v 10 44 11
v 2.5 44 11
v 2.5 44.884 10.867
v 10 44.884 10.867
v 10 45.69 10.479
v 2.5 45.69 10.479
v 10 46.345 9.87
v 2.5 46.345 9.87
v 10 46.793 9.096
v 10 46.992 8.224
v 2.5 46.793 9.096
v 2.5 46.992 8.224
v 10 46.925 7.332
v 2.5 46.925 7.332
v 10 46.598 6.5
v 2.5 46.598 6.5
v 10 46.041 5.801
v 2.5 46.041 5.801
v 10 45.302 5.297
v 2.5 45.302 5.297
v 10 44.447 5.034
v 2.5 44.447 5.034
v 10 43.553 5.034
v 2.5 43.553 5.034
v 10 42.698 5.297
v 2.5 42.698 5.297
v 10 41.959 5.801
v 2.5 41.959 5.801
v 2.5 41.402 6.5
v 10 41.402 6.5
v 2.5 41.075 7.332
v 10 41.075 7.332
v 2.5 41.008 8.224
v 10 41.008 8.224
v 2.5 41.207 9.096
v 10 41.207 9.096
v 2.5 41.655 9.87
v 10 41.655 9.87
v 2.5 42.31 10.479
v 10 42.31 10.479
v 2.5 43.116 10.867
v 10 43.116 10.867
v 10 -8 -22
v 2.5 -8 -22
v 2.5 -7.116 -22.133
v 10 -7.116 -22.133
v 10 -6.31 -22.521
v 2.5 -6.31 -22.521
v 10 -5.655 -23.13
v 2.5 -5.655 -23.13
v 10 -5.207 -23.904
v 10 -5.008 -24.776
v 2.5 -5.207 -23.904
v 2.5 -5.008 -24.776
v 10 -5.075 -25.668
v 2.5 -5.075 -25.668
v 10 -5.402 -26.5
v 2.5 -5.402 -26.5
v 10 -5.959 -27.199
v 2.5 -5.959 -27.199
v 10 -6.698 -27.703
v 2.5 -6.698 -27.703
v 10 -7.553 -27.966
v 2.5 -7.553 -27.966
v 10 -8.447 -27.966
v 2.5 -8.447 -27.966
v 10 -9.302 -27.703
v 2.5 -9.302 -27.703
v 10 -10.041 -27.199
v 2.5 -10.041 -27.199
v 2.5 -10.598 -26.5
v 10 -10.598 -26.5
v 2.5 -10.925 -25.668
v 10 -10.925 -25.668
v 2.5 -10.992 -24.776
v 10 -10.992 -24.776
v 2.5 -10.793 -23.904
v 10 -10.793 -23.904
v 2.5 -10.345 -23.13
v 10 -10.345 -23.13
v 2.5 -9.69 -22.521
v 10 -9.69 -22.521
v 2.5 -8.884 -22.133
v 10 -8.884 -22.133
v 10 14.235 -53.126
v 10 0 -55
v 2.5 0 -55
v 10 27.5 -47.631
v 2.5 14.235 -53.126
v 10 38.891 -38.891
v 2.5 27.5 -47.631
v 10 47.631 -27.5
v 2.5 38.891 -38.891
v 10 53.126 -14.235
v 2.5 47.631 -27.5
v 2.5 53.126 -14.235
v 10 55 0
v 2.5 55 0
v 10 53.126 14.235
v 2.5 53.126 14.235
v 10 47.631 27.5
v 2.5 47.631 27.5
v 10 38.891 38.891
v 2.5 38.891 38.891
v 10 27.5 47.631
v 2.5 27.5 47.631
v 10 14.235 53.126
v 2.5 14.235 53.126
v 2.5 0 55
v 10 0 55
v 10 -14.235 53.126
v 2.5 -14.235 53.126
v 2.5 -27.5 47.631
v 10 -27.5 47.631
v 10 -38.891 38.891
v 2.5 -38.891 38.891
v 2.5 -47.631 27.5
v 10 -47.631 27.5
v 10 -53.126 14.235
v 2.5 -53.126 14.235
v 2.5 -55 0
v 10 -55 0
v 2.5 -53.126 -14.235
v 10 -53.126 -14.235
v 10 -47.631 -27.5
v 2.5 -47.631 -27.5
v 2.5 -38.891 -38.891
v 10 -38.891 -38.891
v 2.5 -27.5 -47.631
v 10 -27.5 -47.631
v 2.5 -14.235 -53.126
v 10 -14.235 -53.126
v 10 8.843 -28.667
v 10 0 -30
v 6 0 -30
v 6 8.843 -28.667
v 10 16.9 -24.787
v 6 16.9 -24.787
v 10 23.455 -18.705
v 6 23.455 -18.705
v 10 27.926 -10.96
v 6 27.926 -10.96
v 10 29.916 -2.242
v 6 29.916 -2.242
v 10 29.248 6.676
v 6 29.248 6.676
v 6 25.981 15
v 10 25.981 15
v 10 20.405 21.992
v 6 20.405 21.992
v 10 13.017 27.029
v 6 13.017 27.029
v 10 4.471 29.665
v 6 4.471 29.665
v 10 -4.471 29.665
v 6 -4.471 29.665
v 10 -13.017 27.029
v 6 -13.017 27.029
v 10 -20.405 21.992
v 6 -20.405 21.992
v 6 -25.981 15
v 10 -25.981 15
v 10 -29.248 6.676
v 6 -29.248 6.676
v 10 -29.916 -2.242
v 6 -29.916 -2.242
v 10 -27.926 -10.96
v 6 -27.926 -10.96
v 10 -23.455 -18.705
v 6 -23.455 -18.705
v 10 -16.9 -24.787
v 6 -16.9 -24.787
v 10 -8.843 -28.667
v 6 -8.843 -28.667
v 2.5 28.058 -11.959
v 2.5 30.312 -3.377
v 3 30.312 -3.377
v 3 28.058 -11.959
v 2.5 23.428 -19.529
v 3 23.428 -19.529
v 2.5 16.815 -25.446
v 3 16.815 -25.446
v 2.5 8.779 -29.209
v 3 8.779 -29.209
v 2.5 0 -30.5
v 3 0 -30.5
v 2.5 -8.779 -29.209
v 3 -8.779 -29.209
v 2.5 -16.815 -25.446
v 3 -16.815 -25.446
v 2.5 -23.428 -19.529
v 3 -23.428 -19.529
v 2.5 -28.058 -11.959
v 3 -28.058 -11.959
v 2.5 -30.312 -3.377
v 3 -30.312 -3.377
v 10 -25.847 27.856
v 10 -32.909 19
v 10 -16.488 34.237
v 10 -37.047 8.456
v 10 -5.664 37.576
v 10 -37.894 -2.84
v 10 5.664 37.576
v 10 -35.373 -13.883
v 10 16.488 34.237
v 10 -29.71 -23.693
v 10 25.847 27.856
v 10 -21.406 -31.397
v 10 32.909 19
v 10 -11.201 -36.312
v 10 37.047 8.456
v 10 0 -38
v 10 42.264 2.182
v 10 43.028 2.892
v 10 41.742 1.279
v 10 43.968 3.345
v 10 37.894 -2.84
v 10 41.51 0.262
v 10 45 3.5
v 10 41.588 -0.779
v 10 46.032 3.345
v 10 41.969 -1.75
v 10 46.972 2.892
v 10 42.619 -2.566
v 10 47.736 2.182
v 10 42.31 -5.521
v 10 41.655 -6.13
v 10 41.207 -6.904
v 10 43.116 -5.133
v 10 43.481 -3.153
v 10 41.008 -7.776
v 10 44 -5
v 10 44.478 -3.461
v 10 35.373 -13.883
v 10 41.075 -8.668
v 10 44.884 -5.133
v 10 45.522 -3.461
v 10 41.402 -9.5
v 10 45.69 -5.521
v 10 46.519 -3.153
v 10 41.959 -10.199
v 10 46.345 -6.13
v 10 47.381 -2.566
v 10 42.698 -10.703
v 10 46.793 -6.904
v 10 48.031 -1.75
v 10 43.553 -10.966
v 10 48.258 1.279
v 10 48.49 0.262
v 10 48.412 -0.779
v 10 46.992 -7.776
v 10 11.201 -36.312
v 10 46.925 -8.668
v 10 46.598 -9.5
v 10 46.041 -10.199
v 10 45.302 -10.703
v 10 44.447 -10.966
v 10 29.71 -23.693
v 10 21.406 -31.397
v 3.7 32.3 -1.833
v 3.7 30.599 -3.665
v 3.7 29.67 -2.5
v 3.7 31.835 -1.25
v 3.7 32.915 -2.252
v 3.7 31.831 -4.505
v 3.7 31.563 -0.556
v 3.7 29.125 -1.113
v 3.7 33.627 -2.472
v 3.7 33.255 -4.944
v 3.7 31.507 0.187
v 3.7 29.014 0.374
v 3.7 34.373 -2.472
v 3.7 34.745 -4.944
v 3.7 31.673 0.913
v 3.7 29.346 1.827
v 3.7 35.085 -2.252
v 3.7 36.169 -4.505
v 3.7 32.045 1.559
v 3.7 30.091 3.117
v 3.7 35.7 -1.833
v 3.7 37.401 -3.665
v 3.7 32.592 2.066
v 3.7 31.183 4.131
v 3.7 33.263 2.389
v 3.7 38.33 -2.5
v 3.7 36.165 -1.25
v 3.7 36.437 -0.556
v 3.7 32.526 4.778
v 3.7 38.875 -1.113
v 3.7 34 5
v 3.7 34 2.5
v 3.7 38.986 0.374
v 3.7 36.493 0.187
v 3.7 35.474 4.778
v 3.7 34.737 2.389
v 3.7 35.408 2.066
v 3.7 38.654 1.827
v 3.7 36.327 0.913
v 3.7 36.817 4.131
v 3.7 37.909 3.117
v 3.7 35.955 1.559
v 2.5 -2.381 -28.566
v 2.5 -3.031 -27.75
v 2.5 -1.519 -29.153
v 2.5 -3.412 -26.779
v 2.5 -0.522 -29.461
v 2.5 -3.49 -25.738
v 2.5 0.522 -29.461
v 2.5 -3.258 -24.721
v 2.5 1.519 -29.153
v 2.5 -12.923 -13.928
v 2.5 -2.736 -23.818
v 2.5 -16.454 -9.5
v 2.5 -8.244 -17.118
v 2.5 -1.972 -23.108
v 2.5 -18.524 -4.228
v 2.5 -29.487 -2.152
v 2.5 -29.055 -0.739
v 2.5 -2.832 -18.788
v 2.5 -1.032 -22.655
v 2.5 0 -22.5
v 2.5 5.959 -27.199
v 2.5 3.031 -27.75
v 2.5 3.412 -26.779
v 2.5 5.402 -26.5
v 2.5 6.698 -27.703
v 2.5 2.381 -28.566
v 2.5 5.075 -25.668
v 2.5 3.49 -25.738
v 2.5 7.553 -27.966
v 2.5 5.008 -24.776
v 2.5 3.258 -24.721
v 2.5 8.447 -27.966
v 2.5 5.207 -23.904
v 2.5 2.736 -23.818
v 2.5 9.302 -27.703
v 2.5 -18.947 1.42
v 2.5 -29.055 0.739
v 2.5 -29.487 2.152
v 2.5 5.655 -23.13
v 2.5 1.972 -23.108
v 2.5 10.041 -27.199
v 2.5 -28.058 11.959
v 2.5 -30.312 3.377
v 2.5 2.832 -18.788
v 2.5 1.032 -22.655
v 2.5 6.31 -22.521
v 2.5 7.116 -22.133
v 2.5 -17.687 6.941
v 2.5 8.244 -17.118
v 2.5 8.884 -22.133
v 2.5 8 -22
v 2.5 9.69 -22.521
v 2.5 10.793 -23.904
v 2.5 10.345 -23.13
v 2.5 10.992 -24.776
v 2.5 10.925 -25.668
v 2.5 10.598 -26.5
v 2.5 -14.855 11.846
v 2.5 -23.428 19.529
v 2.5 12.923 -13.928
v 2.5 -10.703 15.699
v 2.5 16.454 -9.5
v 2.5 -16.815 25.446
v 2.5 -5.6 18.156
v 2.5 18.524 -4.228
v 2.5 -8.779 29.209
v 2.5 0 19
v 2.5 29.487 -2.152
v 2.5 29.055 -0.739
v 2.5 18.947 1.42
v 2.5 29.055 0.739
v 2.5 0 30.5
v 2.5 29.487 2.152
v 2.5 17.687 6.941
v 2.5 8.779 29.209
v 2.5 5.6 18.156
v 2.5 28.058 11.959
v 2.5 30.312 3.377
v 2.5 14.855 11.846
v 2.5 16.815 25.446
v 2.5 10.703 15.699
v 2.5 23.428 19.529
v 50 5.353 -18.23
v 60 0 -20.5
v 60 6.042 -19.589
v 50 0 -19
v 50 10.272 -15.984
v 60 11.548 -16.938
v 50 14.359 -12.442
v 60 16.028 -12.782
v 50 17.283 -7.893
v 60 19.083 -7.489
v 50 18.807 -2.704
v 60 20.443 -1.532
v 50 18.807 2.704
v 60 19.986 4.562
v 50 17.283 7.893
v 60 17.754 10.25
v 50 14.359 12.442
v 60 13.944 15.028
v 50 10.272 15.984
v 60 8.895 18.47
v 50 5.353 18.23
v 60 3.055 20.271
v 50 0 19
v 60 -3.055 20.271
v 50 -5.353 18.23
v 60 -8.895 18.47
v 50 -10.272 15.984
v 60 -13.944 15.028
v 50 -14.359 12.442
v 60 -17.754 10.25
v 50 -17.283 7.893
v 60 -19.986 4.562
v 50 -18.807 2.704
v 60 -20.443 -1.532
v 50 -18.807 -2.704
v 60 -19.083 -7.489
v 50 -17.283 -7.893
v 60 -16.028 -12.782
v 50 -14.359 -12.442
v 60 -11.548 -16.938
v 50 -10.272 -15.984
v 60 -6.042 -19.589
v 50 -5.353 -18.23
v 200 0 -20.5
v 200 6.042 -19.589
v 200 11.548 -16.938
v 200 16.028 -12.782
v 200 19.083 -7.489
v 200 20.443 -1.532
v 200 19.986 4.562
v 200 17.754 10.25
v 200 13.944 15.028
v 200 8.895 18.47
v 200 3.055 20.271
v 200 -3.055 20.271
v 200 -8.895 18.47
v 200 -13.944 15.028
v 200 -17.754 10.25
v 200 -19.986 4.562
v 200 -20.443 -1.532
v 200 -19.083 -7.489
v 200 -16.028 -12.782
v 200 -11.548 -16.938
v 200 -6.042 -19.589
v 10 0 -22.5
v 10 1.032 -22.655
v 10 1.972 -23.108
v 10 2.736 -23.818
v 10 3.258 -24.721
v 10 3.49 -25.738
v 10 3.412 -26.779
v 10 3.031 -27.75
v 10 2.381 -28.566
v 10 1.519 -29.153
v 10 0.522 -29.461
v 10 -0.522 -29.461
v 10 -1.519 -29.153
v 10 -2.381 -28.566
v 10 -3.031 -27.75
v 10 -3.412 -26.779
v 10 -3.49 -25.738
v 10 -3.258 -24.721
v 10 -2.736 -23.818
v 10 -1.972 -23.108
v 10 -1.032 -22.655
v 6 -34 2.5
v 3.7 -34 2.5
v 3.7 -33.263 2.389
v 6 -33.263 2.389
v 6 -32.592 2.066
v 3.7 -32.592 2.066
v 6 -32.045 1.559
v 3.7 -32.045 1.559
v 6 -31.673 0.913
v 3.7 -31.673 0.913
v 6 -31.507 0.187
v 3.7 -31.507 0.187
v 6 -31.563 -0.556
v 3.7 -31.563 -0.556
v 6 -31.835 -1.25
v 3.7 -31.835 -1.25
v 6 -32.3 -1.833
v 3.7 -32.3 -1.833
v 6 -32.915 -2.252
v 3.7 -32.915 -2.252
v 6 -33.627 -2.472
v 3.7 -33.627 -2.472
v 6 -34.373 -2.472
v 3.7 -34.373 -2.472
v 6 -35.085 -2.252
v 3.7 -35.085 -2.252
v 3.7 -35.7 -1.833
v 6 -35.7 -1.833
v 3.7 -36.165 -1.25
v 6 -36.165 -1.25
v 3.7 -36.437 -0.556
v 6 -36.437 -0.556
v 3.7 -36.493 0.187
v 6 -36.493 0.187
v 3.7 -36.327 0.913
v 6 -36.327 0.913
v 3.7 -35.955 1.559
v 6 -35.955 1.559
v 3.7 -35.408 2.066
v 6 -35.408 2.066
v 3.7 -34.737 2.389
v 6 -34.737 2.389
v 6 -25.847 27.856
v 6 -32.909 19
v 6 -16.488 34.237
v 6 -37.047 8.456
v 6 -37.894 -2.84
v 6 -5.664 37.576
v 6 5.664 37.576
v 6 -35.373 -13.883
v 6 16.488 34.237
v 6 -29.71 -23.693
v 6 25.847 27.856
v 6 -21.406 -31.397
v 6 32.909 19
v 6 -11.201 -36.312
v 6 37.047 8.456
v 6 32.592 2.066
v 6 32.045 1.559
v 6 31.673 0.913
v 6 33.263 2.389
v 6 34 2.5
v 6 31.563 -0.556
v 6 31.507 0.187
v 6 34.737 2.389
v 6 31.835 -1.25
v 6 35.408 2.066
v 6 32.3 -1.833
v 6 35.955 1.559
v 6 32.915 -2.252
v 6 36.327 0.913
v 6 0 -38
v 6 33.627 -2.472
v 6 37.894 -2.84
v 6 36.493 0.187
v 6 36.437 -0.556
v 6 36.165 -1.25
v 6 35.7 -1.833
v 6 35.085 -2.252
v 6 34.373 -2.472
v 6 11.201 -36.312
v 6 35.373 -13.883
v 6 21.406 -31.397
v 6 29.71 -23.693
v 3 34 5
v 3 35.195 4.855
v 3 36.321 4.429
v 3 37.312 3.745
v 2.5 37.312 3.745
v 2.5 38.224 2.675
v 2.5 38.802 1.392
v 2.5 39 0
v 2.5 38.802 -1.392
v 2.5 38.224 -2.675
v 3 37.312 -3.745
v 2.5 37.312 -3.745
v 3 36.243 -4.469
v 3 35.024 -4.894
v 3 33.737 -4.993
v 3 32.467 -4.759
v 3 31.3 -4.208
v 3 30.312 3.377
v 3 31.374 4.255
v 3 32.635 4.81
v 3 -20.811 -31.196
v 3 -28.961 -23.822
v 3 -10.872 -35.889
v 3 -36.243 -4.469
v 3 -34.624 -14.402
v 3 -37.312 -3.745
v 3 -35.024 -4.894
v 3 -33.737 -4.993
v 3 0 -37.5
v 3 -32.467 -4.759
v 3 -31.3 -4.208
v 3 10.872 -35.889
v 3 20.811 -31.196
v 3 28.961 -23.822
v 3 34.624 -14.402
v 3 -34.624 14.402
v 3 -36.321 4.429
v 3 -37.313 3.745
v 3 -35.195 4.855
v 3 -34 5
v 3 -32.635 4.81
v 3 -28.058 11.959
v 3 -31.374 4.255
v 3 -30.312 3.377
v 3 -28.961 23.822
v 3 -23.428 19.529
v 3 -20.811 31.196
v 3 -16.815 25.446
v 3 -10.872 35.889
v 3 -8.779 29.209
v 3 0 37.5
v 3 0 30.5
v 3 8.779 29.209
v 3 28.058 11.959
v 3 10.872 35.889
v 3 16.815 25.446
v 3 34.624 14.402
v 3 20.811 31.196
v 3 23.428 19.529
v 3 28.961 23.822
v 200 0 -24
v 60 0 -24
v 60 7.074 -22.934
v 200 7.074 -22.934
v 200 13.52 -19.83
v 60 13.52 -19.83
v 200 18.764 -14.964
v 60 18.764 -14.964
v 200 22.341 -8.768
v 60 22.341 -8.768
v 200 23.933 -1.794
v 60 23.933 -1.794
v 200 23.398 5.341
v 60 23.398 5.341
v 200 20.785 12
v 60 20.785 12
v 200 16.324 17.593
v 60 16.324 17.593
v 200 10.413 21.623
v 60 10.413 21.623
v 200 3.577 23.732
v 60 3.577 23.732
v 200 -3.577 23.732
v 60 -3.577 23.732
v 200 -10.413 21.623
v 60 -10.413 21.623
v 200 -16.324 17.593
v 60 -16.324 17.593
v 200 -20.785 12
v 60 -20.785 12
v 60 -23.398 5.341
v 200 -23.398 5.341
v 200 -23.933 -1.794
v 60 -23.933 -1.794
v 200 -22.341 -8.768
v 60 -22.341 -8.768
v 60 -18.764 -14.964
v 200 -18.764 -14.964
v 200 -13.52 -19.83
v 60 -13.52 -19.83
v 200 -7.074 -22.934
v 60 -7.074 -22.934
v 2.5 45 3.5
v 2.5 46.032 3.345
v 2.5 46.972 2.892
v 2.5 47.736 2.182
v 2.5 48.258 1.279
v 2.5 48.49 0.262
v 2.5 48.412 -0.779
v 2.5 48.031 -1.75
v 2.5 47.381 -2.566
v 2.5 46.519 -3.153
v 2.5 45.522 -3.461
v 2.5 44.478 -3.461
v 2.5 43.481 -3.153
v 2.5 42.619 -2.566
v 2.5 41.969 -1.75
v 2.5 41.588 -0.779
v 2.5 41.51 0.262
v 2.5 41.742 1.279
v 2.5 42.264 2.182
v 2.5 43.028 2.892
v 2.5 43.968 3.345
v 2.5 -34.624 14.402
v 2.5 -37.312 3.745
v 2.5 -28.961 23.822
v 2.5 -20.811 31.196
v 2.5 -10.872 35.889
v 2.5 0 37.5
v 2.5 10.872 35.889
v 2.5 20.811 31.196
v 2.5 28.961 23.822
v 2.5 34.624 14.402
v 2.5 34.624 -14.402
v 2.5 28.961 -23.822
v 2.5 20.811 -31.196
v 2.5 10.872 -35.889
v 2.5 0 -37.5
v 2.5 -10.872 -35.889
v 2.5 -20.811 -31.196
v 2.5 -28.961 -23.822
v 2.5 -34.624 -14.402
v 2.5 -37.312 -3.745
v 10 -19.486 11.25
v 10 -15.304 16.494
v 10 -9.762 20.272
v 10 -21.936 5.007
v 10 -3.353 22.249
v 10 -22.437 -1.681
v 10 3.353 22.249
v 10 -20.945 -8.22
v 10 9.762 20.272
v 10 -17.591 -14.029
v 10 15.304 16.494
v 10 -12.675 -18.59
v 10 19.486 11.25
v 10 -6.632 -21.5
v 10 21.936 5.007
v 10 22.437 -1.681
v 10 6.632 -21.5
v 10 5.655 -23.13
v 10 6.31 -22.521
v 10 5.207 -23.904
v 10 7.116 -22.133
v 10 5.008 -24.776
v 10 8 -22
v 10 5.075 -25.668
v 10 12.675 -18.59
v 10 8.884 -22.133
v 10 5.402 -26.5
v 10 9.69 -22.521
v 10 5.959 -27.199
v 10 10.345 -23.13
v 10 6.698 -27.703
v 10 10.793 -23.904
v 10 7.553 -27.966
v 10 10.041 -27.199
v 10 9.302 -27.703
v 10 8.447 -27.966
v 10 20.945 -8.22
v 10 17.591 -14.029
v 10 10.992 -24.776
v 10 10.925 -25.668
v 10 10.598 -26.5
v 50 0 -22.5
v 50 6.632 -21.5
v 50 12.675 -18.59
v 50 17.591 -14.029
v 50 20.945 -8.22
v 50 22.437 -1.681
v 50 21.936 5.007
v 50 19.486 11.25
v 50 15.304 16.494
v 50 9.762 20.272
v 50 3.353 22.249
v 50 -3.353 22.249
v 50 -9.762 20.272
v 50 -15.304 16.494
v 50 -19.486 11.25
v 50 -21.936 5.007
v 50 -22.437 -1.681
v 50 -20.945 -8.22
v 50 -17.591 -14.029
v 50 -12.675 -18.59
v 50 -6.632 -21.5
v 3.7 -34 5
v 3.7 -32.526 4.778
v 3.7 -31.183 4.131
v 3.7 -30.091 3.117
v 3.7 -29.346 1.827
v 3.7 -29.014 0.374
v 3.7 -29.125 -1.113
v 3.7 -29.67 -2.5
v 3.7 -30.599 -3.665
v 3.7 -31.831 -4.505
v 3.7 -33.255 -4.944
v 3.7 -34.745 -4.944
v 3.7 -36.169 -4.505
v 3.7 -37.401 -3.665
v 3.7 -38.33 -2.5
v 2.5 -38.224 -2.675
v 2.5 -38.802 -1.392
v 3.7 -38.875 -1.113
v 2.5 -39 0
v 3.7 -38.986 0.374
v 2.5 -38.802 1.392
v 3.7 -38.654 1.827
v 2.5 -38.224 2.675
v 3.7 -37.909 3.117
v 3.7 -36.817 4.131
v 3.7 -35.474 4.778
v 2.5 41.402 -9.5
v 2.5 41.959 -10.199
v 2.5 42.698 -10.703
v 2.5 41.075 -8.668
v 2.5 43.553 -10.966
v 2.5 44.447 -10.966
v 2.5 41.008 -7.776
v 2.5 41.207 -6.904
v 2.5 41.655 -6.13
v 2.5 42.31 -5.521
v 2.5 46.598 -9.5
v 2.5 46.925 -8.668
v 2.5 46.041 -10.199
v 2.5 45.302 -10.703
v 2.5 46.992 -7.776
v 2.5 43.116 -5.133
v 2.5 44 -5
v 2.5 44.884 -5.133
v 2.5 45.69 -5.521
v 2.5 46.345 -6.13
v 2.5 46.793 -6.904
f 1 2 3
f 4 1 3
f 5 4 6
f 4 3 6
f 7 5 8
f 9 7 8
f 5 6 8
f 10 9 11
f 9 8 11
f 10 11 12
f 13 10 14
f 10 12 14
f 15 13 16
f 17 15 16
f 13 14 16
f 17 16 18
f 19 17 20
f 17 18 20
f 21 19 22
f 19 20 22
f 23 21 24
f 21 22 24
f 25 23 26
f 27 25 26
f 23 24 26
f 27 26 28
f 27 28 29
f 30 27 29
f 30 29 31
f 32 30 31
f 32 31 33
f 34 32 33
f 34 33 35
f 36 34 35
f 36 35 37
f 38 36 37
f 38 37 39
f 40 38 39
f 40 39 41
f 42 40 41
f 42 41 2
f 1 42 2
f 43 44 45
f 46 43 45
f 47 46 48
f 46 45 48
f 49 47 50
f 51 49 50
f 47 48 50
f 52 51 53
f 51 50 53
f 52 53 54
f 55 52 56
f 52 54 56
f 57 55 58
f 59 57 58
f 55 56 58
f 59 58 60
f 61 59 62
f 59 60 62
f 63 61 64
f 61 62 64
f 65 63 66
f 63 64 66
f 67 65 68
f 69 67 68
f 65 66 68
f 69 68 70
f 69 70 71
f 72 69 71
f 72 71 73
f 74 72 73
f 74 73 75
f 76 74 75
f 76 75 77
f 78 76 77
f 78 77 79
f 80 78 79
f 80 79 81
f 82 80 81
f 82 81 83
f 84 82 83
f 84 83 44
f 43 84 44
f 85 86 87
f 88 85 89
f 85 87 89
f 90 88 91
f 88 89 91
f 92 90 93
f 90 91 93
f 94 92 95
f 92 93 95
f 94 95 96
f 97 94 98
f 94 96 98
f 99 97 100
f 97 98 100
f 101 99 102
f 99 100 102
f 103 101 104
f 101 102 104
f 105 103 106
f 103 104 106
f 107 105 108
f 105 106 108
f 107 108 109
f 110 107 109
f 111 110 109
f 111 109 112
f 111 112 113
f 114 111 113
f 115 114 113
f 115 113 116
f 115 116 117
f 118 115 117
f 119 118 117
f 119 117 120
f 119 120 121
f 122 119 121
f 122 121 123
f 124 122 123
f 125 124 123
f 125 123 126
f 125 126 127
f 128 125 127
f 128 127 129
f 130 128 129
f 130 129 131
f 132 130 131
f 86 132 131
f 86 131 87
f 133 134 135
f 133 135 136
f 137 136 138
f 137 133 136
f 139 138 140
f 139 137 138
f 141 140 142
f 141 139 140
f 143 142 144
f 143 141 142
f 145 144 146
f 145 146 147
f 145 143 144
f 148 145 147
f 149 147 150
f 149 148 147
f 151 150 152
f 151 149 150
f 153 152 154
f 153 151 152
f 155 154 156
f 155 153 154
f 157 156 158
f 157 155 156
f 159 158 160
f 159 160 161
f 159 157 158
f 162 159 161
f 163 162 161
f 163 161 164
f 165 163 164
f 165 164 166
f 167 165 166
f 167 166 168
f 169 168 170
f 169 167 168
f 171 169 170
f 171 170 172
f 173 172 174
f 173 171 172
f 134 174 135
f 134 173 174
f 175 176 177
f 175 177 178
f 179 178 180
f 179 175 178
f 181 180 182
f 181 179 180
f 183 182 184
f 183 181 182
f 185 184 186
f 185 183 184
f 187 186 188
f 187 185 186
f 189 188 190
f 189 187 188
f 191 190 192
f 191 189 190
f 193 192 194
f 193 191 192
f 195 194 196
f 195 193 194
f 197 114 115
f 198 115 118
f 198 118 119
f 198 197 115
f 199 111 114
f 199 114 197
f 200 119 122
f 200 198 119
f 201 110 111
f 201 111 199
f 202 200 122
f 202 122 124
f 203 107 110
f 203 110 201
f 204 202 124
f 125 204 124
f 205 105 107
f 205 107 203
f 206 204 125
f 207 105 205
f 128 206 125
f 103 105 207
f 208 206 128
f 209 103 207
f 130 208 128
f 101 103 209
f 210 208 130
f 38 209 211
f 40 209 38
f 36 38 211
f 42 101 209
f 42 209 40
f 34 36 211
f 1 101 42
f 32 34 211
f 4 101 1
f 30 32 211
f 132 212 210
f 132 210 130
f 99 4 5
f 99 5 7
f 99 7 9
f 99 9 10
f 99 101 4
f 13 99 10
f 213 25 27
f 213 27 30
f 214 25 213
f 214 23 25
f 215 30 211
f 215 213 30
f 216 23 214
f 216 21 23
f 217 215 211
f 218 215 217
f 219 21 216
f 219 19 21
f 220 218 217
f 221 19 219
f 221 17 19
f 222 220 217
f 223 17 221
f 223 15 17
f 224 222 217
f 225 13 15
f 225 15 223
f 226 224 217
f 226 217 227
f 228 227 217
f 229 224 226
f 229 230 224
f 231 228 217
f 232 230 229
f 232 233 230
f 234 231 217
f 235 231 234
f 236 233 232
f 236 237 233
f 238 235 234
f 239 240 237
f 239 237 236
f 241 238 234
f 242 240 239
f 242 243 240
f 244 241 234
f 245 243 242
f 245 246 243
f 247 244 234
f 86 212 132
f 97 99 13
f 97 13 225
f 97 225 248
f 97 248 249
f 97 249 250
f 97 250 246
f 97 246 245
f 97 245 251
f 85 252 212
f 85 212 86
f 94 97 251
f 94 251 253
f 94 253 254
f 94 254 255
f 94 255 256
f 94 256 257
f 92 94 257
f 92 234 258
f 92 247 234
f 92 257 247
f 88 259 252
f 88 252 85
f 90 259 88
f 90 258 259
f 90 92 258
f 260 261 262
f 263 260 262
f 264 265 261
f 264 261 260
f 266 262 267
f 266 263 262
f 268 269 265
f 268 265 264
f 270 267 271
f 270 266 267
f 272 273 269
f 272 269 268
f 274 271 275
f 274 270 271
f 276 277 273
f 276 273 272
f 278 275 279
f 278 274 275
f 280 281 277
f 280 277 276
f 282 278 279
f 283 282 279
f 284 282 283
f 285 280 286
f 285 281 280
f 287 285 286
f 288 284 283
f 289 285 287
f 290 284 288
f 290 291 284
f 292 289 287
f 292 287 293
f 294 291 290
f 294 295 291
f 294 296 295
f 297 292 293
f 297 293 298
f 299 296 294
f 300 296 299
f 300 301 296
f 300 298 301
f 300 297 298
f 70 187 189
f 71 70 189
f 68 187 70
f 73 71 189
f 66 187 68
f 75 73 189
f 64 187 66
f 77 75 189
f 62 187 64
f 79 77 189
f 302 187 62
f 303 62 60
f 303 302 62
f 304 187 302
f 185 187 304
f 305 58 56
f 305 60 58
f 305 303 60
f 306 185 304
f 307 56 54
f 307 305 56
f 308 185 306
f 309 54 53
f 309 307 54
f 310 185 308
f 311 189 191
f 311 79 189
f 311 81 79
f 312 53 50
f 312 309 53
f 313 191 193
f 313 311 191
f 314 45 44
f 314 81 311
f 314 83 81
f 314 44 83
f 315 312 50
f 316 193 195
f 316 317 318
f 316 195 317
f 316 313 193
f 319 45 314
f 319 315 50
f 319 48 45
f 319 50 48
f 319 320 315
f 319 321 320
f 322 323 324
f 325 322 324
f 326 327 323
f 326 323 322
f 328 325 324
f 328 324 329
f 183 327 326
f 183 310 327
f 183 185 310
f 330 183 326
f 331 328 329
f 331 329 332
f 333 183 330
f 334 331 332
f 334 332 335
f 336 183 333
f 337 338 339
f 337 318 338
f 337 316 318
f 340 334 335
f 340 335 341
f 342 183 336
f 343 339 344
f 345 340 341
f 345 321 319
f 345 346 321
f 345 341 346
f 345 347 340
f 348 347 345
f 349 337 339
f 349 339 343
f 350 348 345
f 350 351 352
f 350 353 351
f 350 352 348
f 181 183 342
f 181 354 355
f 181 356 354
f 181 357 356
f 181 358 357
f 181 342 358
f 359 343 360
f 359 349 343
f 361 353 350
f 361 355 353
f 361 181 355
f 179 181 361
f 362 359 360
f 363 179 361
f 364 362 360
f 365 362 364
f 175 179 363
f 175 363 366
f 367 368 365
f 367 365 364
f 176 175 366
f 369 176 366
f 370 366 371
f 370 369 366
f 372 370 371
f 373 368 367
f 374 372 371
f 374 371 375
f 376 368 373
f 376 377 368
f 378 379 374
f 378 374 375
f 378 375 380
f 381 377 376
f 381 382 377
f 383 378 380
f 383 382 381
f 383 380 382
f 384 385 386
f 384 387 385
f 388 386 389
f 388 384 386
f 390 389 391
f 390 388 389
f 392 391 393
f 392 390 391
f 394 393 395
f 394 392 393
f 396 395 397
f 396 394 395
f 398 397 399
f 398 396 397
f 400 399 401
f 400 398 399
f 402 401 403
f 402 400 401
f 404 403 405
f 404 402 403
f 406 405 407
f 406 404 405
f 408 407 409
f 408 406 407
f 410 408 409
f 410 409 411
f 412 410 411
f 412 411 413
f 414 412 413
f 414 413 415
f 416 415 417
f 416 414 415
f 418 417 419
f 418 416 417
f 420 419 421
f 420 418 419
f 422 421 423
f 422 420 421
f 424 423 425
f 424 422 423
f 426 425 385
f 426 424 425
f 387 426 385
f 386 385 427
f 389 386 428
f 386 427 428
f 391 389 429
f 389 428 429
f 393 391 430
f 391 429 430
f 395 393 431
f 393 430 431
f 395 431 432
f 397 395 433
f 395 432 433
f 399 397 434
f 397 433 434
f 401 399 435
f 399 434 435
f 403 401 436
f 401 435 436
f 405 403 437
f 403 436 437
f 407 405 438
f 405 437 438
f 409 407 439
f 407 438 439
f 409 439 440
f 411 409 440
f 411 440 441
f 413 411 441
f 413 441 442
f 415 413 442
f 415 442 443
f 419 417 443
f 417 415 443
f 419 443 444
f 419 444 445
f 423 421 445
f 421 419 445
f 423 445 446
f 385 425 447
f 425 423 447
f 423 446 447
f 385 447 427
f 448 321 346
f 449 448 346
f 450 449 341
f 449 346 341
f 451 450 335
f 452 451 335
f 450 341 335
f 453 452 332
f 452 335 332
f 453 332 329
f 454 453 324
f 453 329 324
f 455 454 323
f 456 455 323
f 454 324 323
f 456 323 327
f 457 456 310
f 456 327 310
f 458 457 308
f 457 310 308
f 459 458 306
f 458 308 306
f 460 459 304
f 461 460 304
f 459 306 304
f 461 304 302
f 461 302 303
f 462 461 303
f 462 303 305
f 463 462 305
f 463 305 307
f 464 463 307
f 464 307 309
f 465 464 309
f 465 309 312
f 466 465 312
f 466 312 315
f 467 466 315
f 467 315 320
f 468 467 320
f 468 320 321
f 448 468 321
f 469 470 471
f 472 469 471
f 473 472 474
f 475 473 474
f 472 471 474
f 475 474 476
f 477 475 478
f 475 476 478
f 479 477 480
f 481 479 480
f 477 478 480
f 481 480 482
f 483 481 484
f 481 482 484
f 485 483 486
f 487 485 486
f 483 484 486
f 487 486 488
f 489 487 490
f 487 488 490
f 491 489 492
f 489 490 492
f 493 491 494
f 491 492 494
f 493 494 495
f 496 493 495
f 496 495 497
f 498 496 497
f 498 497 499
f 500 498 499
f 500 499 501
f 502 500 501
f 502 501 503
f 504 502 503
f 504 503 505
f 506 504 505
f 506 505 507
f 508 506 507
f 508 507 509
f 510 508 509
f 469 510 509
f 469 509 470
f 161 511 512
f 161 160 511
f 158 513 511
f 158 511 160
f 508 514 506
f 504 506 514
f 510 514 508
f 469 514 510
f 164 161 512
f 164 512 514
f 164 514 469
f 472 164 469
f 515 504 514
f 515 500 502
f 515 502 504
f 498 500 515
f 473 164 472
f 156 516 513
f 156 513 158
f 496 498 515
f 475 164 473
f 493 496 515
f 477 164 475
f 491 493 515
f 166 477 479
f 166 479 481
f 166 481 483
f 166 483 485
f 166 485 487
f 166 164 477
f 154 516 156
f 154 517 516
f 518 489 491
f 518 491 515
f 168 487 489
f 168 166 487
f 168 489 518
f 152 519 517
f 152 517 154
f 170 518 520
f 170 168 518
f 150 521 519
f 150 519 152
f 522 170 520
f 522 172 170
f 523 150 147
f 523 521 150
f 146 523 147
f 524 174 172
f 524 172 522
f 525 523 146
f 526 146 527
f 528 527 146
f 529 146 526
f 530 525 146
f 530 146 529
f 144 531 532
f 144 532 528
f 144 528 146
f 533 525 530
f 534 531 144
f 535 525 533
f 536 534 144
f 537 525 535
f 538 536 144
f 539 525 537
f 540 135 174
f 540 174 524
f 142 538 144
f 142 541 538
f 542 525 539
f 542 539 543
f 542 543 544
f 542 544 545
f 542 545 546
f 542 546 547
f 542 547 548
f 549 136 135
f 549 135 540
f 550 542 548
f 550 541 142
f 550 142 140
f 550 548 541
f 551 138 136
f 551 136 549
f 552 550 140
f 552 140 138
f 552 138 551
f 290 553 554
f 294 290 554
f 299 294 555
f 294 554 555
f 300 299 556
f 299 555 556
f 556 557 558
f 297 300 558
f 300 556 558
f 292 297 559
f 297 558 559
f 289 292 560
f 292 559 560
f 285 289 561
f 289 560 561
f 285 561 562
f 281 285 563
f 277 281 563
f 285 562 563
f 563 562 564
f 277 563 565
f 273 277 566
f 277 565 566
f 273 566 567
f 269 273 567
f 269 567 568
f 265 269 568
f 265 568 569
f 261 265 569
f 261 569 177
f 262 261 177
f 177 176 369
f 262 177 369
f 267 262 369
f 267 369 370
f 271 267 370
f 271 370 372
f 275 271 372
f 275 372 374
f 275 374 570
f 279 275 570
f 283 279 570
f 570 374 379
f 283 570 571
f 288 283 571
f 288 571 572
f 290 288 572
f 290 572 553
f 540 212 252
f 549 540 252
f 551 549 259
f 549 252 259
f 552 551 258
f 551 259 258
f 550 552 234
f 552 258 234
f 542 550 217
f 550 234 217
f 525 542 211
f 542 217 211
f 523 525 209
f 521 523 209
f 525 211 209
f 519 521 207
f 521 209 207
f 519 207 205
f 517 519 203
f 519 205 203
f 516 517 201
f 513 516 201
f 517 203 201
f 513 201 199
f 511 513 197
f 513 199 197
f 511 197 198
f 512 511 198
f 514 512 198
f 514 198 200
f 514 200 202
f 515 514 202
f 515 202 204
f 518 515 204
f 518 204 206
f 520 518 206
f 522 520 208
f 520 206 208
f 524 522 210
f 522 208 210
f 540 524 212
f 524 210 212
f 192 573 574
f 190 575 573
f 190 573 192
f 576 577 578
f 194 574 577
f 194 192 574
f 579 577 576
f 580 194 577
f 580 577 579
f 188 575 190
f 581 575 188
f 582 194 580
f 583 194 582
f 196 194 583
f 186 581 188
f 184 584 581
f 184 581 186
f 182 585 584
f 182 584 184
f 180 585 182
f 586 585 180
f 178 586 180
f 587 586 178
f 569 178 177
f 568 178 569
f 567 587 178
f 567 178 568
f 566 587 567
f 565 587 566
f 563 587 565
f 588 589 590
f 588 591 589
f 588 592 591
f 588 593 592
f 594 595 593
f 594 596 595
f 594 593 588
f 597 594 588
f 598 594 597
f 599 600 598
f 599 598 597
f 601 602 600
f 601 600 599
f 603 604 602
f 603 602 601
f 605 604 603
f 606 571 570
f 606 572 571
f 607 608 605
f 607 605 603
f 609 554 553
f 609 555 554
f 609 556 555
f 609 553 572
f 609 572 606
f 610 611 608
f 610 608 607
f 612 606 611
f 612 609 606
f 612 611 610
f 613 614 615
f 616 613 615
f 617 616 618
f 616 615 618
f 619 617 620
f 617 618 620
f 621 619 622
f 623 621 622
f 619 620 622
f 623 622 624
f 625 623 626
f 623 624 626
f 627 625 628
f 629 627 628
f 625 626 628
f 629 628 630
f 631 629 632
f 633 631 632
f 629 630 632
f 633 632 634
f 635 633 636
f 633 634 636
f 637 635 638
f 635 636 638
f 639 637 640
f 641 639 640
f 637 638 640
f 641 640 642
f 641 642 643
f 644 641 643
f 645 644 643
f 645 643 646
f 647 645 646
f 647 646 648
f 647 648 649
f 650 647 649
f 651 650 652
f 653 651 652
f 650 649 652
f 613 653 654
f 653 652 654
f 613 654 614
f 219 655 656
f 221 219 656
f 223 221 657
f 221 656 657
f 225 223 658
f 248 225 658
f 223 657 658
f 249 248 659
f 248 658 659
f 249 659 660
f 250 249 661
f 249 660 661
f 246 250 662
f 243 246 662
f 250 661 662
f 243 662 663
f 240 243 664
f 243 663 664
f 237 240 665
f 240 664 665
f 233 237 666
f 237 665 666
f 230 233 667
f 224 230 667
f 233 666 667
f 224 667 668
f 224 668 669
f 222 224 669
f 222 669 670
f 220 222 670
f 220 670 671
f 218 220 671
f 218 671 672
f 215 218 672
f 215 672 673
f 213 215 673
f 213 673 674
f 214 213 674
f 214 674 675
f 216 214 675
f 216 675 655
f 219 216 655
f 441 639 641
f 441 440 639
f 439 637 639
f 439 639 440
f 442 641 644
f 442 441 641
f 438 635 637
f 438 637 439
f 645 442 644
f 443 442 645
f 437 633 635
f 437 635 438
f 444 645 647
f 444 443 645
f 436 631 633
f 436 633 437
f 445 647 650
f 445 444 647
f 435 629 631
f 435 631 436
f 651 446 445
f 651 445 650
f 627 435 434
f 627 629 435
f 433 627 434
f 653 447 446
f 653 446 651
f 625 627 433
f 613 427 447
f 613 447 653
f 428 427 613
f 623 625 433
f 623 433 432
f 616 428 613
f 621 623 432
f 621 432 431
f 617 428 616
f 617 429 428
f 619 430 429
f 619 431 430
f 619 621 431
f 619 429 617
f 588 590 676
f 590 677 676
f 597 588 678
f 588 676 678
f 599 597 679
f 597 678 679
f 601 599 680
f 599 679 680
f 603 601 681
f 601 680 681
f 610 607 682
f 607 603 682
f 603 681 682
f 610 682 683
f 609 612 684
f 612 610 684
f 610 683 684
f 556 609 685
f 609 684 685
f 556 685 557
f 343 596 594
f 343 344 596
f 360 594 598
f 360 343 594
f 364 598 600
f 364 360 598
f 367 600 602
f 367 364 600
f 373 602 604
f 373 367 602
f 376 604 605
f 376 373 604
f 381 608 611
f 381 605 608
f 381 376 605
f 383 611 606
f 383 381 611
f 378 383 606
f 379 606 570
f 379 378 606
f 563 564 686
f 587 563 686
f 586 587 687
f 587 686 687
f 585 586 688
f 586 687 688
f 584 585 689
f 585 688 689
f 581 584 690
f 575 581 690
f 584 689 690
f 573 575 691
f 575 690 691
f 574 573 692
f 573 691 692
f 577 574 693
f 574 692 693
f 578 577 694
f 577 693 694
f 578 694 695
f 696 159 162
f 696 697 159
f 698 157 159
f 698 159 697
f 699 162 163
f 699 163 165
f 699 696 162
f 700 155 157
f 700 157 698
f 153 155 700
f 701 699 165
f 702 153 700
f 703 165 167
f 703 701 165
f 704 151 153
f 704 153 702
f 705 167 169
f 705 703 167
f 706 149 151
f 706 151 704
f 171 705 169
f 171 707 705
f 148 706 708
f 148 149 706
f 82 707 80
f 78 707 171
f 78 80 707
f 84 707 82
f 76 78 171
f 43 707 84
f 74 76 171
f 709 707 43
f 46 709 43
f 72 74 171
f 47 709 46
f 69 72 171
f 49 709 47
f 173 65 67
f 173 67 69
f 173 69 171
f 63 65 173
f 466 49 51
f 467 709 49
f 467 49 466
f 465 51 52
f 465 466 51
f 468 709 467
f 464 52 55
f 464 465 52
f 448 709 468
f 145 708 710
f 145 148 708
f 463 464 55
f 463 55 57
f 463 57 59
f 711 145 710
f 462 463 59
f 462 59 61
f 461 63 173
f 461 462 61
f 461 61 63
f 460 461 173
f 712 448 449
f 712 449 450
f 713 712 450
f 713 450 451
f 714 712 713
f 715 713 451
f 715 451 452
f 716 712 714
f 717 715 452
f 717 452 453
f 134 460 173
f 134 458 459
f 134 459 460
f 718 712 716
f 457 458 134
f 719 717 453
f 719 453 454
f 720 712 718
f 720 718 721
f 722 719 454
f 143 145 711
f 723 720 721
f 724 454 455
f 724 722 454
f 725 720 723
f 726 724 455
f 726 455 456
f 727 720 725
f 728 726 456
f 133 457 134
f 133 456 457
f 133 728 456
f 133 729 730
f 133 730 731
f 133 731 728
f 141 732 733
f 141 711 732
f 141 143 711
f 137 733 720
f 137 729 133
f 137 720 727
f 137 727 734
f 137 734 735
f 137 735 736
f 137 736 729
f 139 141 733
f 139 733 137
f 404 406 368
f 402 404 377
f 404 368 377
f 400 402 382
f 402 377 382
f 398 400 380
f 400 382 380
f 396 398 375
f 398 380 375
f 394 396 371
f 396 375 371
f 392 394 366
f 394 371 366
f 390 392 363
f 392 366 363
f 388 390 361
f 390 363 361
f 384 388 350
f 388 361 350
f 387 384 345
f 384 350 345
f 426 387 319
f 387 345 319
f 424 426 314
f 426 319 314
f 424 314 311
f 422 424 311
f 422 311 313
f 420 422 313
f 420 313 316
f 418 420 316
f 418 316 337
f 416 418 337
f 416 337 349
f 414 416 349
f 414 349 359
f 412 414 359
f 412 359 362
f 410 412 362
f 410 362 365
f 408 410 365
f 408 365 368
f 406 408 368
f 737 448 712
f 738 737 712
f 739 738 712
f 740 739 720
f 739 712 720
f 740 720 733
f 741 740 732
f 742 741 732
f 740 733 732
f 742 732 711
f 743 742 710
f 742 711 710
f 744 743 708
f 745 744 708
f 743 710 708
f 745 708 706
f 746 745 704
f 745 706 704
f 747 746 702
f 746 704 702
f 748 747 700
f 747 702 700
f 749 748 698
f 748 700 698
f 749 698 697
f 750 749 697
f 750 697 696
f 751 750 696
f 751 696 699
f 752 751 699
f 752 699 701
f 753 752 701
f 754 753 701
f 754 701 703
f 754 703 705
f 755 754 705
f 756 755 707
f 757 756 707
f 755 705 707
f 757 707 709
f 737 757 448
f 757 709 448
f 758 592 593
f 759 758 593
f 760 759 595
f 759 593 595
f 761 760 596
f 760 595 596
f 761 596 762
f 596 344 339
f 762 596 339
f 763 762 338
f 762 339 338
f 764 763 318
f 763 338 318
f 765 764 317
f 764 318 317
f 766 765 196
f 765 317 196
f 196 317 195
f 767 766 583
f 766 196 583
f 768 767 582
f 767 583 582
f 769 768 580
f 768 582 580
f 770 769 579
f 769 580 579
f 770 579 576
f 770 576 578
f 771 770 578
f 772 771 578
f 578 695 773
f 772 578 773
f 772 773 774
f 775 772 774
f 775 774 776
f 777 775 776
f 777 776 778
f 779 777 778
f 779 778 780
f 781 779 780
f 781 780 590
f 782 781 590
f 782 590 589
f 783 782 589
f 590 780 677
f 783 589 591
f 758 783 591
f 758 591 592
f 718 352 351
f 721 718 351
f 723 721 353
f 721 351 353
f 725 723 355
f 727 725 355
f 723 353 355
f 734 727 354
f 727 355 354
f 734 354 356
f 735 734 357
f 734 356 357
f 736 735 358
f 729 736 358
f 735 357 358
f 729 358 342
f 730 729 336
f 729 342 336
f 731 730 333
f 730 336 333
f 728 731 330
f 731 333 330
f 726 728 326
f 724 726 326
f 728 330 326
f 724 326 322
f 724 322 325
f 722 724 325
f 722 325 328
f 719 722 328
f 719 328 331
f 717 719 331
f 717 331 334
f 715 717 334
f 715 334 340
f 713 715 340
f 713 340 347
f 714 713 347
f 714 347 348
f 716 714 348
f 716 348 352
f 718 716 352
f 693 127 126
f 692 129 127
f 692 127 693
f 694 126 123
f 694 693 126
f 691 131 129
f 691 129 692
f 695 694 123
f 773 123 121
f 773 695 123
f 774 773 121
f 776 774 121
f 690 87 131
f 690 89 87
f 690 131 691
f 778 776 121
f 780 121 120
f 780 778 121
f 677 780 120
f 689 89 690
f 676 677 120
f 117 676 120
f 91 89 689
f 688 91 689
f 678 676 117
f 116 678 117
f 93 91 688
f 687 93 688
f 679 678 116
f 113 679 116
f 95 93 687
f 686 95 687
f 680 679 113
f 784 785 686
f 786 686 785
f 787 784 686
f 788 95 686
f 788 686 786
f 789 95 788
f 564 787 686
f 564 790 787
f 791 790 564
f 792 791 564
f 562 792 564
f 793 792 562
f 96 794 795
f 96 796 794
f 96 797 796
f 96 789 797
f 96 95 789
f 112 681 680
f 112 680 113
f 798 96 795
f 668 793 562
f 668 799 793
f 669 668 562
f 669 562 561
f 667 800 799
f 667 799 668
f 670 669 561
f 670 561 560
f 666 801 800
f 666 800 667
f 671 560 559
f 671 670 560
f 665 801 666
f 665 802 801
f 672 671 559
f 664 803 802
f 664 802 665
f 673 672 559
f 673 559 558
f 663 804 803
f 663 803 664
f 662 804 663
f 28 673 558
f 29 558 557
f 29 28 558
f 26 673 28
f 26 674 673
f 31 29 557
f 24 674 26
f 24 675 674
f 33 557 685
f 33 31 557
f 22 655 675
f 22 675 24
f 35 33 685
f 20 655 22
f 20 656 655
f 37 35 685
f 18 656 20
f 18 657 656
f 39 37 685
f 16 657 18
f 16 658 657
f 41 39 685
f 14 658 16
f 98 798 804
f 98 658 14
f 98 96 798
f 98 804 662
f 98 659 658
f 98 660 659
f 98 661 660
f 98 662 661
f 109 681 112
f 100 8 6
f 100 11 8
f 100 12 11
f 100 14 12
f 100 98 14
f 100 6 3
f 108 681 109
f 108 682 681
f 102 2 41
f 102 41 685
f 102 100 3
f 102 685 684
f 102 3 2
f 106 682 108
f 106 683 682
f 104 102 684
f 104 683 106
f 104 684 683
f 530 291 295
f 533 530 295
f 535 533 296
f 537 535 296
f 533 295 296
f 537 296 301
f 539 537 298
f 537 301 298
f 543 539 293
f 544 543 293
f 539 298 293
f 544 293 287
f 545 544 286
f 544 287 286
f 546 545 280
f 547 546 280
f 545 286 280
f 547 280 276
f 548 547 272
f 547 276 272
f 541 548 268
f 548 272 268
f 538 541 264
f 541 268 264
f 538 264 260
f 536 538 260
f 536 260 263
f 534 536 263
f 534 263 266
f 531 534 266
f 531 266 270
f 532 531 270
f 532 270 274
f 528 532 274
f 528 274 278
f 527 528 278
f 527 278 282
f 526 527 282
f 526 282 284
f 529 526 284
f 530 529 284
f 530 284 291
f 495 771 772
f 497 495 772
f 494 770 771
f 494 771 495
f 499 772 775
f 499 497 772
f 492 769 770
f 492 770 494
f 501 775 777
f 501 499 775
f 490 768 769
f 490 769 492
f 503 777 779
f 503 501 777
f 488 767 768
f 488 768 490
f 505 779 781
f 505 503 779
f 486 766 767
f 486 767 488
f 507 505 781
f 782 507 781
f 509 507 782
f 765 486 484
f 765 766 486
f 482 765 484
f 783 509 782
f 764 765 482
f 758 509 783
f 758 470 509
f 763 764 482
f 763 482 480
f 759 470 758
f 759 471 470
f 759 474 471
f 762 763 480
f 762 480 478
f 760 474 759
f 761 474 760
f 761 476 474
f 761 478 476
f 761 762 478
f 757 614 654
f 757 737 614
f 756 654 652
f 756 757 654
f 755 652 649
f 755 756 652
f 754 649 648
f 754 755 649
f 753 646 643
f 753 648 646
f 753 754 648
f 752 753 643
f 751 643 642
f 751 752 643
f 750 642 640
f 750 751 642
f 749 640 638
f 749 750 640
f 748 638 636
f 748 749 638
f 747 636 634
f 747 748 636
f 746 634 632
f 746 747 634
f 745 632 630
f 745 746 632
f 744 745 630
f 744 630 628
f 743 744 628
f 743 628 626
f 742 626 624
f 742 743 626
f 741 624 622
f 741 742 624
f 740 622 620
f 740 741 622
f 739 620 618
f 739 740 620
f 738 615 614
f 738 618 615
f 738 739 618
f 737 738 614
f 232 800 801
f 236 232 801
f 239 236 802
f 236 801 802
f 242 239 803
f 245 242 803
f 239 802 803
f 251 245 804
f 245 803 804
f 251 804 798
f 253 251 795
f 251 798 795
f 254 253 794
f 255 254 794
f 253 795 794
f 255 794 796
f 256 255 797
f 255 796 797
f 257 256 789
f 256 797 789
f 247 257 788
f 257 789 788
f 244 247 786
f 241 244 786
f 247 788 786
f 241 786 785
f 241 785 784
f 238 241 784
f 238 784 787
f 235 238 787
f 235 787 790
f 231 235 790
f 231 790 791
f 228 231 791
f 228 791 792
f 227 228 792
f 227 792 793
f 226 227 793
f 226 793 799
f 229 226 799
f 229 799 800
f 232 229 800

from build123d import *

# Parameters (mm, degrees)
SKETCH2_R               = 55
BOSS_EXTRUDE1_DEPTH     = 10
SKETCH3_R               = 22.5
BOSS_EXTRUDE2_DEPTH     = 40
SKETCH4_R               = 19
CUT_EXTRUDE1_DEPTH      = 93.466210045
CUT_EXTRUDE1_DEPTH_BACK = 93.466210045
SKETCH14_R              = 37.5
SKETCH14_R_2            = 30.5
CUT_EXTRUDE5_DEPTH      = 3
SKETCH15_R              = 38
SKETCH15_R_2            = 30
CUT_EXTRUDE6_DEPTH      = 4
SKETCH16_R              = 2.5
CUT_EXTRUDE7_DEPTH      = 93.466210045
SKETCH17_R              = 5
CUT_EXTRUDE8_DEPTH      = 3.7
SKETCH20_R              = 3.5
SKETCH20_R_2            = 3
CUT_EXTRUDE9_DEPTH      = 10
SKETCH21_R              = 3.5
SKETCH21_R_2            = 3
CUT_EXTRUDE10_DEPTH     = 10
SKETCH22_R              = 24
BOSS_EXTRUDE3_DEPTH     = 140
SKETCH23_R              = 20.5
CUT_EXTRUDE11_DEPTH     = 140
SKETCH25_R              = 103.972470389
CUT_EXTRUDE12_DEPTH     = 2.5


with BuildPart() as part:
    # Sketch2 → Boss-Extrude1 (new body)
    with BuildSketch(Plane(origin=(0, 0, 0), x_dir=(0, 0, -1), z_dir=(1, 0, 0))):
        Circle(SKETCH2_R)
    extrude(amount=BOSS_EXTRUDE1_DEPTH)

    # Sketch3 → Boss-Extrude2 (add)
    with BuildSketch(Plane(origin=(10, 0, 0), x_dir=(0, 0, -1), z_dir=(1, 0, 0))):
        Circle(SKETCH3_R)
    extrude(amount=BOSS_EXTRUDE2_DEPTH)

    # Sketch4 → Cut-Extrude1 (cut, two sides)
    with BuildSketch(Plane.ZY) as cut_extrude1_sk:
        Circle(SKETCH4_R)
    extrude(amount=CUT_EXTRUDE1_DEPTH, mode=Mode.SUBTRACT)
    extrude(cut_extrude1_sk.sketch, amount=-CUT_EXTRUDE1_DEPTH_BACK, mode=Mode.SUBTRACT)

    # Sketch14 → Cut-Extrude5 (cut)
    with BuildSketch(Plane.ZY):
        Circle(SKETCH14_R)
        Circle(SKETCH14_R_2, mode=Mode.SUBTRACT)
    extrude(amount=-CUT_EXTRUDE5_DEPTH, mode=Mode.SUBTRACT)

    # Sketch15 → Cut-Extrude6 (cut)
    with BuildSketch(Plane(origin=(10, 0, 0), x_dir=(0, 0, -1), z_dir=(1, 0, 0))):
        Circle(SKETCH15_R)
        Circle(SKETCH15_R_2, mode=Mode.SUBTRACT)
    extrude(amount=-CUT_EXTRUDE6_DEPTH, mode=Mode.SUBTRACT)

    # Sketch16 → Cut-Extrude7 (cut, through all)
    with BuildSketch(Plane.ZY):
        with Locations((0, 34)):
            Circle(SKETCH16_R)
        with Locations((0, -34)):
            Circle(SKETCH16_R)
    extrude(amount=-CUT_EXTRUDE7_DEPTH, mode=Mode.SUBTRACT)

    # Sketch17 → Cut-Extrude8 (cut)
    with BuildSketch(Plane.ZY):
        with Locations((0, -34)):
            Circle(SKETCH17_R)
        with Locations((0, 34)):
            Circle(SKETCH17_R)
    extrude(amount=-CUT_EXTRUDE8_DEPTH, mode=Mode.SUBTRACT)

    # Sketch20 → Cut-Extrude9 (cut)
    with BuildSketch(Plane.ZY):
        with Locations((-26, 0)):
            Circle(SKETCH20_R)
        with Locations((-25, -8)):
            Circle(SKETCH20_R_2)
        with Locations((-25, 8)):
            Circle(SKETCH20_R_2)
    extrude(amount=-CUT_EXTRUDE9_DEPTH, mode=Mode.SUBTRACT)

    # Sketch21 → Cut-Extrude10 (cut)
    with BuildSketch(Plane.ZY):
        with Locations((0, 45)):
            Circle(SKETCH21_R)
        with Locations((-8, 44)):
            Circle(SKETCH21_R_2)
        with Locations((8, 44)):
            Circle(SKETCH21_R_2)
    extrude(amount=-CUT_EXTRUDE10_DEPTH, mode=Mode.SUBTRACT)


with BuildPart() as body_2:
    # Sketch22 → Boss-Extrude3 (new body)
    with BuildSketch(Plane(origin=(60, 0, 0), x_dir=(0, 0, -1), z_dir=(1, 0, 0))):
        Circle(SKETCH22_R)
    extrude(amount=BOSS_EXTRUDE3_DEPTH)

    # Sketch23 → Cut-Extrude11 (cut)
    with BuildSketch(Plane(origin=(200, 0, 0), x_dir=(0, 0, -1), z_dir=(1, 0, 0))):
        Circle(SKETCH23_R)
    extrude(amount=-CUT_EXTRUDE11_DEPTH, mode=Mode.SUBTRACT)


    add(part.part)  # loft5 joins it to this body
    # loft up to a face of the part (loft5)
    loft([Face(Wire([body_2.edges().sort_by_distance((60, -17.495247058, 16.429130542))[0]])), Face(Wire([body_2.edges().sort_by_distance((50, -16.401794117, 15.402309883))[0]]))])

    # loft up to a face of the part (cut_loft1)
    loft([Face(Wire([body_2.edges().sort_by_distance((60, 14.943856862, 14.033215672))[0]])), Face(Wire([body_2.edges().sort_by_distance((50, 13.850403921, -13.006395013))[0]]))], mode=Mode.SUBTRACT)

    # Sketch25 → Cut-Extrude12 (cut)
    with BuildSketch(Plane.ZY):
        Circle(SKETCH25_R)
    extrude(amount=-CUT_EXTRUDE12_DEPTH, mode=Mode.SUBTRACT)


solid = body_2.part
